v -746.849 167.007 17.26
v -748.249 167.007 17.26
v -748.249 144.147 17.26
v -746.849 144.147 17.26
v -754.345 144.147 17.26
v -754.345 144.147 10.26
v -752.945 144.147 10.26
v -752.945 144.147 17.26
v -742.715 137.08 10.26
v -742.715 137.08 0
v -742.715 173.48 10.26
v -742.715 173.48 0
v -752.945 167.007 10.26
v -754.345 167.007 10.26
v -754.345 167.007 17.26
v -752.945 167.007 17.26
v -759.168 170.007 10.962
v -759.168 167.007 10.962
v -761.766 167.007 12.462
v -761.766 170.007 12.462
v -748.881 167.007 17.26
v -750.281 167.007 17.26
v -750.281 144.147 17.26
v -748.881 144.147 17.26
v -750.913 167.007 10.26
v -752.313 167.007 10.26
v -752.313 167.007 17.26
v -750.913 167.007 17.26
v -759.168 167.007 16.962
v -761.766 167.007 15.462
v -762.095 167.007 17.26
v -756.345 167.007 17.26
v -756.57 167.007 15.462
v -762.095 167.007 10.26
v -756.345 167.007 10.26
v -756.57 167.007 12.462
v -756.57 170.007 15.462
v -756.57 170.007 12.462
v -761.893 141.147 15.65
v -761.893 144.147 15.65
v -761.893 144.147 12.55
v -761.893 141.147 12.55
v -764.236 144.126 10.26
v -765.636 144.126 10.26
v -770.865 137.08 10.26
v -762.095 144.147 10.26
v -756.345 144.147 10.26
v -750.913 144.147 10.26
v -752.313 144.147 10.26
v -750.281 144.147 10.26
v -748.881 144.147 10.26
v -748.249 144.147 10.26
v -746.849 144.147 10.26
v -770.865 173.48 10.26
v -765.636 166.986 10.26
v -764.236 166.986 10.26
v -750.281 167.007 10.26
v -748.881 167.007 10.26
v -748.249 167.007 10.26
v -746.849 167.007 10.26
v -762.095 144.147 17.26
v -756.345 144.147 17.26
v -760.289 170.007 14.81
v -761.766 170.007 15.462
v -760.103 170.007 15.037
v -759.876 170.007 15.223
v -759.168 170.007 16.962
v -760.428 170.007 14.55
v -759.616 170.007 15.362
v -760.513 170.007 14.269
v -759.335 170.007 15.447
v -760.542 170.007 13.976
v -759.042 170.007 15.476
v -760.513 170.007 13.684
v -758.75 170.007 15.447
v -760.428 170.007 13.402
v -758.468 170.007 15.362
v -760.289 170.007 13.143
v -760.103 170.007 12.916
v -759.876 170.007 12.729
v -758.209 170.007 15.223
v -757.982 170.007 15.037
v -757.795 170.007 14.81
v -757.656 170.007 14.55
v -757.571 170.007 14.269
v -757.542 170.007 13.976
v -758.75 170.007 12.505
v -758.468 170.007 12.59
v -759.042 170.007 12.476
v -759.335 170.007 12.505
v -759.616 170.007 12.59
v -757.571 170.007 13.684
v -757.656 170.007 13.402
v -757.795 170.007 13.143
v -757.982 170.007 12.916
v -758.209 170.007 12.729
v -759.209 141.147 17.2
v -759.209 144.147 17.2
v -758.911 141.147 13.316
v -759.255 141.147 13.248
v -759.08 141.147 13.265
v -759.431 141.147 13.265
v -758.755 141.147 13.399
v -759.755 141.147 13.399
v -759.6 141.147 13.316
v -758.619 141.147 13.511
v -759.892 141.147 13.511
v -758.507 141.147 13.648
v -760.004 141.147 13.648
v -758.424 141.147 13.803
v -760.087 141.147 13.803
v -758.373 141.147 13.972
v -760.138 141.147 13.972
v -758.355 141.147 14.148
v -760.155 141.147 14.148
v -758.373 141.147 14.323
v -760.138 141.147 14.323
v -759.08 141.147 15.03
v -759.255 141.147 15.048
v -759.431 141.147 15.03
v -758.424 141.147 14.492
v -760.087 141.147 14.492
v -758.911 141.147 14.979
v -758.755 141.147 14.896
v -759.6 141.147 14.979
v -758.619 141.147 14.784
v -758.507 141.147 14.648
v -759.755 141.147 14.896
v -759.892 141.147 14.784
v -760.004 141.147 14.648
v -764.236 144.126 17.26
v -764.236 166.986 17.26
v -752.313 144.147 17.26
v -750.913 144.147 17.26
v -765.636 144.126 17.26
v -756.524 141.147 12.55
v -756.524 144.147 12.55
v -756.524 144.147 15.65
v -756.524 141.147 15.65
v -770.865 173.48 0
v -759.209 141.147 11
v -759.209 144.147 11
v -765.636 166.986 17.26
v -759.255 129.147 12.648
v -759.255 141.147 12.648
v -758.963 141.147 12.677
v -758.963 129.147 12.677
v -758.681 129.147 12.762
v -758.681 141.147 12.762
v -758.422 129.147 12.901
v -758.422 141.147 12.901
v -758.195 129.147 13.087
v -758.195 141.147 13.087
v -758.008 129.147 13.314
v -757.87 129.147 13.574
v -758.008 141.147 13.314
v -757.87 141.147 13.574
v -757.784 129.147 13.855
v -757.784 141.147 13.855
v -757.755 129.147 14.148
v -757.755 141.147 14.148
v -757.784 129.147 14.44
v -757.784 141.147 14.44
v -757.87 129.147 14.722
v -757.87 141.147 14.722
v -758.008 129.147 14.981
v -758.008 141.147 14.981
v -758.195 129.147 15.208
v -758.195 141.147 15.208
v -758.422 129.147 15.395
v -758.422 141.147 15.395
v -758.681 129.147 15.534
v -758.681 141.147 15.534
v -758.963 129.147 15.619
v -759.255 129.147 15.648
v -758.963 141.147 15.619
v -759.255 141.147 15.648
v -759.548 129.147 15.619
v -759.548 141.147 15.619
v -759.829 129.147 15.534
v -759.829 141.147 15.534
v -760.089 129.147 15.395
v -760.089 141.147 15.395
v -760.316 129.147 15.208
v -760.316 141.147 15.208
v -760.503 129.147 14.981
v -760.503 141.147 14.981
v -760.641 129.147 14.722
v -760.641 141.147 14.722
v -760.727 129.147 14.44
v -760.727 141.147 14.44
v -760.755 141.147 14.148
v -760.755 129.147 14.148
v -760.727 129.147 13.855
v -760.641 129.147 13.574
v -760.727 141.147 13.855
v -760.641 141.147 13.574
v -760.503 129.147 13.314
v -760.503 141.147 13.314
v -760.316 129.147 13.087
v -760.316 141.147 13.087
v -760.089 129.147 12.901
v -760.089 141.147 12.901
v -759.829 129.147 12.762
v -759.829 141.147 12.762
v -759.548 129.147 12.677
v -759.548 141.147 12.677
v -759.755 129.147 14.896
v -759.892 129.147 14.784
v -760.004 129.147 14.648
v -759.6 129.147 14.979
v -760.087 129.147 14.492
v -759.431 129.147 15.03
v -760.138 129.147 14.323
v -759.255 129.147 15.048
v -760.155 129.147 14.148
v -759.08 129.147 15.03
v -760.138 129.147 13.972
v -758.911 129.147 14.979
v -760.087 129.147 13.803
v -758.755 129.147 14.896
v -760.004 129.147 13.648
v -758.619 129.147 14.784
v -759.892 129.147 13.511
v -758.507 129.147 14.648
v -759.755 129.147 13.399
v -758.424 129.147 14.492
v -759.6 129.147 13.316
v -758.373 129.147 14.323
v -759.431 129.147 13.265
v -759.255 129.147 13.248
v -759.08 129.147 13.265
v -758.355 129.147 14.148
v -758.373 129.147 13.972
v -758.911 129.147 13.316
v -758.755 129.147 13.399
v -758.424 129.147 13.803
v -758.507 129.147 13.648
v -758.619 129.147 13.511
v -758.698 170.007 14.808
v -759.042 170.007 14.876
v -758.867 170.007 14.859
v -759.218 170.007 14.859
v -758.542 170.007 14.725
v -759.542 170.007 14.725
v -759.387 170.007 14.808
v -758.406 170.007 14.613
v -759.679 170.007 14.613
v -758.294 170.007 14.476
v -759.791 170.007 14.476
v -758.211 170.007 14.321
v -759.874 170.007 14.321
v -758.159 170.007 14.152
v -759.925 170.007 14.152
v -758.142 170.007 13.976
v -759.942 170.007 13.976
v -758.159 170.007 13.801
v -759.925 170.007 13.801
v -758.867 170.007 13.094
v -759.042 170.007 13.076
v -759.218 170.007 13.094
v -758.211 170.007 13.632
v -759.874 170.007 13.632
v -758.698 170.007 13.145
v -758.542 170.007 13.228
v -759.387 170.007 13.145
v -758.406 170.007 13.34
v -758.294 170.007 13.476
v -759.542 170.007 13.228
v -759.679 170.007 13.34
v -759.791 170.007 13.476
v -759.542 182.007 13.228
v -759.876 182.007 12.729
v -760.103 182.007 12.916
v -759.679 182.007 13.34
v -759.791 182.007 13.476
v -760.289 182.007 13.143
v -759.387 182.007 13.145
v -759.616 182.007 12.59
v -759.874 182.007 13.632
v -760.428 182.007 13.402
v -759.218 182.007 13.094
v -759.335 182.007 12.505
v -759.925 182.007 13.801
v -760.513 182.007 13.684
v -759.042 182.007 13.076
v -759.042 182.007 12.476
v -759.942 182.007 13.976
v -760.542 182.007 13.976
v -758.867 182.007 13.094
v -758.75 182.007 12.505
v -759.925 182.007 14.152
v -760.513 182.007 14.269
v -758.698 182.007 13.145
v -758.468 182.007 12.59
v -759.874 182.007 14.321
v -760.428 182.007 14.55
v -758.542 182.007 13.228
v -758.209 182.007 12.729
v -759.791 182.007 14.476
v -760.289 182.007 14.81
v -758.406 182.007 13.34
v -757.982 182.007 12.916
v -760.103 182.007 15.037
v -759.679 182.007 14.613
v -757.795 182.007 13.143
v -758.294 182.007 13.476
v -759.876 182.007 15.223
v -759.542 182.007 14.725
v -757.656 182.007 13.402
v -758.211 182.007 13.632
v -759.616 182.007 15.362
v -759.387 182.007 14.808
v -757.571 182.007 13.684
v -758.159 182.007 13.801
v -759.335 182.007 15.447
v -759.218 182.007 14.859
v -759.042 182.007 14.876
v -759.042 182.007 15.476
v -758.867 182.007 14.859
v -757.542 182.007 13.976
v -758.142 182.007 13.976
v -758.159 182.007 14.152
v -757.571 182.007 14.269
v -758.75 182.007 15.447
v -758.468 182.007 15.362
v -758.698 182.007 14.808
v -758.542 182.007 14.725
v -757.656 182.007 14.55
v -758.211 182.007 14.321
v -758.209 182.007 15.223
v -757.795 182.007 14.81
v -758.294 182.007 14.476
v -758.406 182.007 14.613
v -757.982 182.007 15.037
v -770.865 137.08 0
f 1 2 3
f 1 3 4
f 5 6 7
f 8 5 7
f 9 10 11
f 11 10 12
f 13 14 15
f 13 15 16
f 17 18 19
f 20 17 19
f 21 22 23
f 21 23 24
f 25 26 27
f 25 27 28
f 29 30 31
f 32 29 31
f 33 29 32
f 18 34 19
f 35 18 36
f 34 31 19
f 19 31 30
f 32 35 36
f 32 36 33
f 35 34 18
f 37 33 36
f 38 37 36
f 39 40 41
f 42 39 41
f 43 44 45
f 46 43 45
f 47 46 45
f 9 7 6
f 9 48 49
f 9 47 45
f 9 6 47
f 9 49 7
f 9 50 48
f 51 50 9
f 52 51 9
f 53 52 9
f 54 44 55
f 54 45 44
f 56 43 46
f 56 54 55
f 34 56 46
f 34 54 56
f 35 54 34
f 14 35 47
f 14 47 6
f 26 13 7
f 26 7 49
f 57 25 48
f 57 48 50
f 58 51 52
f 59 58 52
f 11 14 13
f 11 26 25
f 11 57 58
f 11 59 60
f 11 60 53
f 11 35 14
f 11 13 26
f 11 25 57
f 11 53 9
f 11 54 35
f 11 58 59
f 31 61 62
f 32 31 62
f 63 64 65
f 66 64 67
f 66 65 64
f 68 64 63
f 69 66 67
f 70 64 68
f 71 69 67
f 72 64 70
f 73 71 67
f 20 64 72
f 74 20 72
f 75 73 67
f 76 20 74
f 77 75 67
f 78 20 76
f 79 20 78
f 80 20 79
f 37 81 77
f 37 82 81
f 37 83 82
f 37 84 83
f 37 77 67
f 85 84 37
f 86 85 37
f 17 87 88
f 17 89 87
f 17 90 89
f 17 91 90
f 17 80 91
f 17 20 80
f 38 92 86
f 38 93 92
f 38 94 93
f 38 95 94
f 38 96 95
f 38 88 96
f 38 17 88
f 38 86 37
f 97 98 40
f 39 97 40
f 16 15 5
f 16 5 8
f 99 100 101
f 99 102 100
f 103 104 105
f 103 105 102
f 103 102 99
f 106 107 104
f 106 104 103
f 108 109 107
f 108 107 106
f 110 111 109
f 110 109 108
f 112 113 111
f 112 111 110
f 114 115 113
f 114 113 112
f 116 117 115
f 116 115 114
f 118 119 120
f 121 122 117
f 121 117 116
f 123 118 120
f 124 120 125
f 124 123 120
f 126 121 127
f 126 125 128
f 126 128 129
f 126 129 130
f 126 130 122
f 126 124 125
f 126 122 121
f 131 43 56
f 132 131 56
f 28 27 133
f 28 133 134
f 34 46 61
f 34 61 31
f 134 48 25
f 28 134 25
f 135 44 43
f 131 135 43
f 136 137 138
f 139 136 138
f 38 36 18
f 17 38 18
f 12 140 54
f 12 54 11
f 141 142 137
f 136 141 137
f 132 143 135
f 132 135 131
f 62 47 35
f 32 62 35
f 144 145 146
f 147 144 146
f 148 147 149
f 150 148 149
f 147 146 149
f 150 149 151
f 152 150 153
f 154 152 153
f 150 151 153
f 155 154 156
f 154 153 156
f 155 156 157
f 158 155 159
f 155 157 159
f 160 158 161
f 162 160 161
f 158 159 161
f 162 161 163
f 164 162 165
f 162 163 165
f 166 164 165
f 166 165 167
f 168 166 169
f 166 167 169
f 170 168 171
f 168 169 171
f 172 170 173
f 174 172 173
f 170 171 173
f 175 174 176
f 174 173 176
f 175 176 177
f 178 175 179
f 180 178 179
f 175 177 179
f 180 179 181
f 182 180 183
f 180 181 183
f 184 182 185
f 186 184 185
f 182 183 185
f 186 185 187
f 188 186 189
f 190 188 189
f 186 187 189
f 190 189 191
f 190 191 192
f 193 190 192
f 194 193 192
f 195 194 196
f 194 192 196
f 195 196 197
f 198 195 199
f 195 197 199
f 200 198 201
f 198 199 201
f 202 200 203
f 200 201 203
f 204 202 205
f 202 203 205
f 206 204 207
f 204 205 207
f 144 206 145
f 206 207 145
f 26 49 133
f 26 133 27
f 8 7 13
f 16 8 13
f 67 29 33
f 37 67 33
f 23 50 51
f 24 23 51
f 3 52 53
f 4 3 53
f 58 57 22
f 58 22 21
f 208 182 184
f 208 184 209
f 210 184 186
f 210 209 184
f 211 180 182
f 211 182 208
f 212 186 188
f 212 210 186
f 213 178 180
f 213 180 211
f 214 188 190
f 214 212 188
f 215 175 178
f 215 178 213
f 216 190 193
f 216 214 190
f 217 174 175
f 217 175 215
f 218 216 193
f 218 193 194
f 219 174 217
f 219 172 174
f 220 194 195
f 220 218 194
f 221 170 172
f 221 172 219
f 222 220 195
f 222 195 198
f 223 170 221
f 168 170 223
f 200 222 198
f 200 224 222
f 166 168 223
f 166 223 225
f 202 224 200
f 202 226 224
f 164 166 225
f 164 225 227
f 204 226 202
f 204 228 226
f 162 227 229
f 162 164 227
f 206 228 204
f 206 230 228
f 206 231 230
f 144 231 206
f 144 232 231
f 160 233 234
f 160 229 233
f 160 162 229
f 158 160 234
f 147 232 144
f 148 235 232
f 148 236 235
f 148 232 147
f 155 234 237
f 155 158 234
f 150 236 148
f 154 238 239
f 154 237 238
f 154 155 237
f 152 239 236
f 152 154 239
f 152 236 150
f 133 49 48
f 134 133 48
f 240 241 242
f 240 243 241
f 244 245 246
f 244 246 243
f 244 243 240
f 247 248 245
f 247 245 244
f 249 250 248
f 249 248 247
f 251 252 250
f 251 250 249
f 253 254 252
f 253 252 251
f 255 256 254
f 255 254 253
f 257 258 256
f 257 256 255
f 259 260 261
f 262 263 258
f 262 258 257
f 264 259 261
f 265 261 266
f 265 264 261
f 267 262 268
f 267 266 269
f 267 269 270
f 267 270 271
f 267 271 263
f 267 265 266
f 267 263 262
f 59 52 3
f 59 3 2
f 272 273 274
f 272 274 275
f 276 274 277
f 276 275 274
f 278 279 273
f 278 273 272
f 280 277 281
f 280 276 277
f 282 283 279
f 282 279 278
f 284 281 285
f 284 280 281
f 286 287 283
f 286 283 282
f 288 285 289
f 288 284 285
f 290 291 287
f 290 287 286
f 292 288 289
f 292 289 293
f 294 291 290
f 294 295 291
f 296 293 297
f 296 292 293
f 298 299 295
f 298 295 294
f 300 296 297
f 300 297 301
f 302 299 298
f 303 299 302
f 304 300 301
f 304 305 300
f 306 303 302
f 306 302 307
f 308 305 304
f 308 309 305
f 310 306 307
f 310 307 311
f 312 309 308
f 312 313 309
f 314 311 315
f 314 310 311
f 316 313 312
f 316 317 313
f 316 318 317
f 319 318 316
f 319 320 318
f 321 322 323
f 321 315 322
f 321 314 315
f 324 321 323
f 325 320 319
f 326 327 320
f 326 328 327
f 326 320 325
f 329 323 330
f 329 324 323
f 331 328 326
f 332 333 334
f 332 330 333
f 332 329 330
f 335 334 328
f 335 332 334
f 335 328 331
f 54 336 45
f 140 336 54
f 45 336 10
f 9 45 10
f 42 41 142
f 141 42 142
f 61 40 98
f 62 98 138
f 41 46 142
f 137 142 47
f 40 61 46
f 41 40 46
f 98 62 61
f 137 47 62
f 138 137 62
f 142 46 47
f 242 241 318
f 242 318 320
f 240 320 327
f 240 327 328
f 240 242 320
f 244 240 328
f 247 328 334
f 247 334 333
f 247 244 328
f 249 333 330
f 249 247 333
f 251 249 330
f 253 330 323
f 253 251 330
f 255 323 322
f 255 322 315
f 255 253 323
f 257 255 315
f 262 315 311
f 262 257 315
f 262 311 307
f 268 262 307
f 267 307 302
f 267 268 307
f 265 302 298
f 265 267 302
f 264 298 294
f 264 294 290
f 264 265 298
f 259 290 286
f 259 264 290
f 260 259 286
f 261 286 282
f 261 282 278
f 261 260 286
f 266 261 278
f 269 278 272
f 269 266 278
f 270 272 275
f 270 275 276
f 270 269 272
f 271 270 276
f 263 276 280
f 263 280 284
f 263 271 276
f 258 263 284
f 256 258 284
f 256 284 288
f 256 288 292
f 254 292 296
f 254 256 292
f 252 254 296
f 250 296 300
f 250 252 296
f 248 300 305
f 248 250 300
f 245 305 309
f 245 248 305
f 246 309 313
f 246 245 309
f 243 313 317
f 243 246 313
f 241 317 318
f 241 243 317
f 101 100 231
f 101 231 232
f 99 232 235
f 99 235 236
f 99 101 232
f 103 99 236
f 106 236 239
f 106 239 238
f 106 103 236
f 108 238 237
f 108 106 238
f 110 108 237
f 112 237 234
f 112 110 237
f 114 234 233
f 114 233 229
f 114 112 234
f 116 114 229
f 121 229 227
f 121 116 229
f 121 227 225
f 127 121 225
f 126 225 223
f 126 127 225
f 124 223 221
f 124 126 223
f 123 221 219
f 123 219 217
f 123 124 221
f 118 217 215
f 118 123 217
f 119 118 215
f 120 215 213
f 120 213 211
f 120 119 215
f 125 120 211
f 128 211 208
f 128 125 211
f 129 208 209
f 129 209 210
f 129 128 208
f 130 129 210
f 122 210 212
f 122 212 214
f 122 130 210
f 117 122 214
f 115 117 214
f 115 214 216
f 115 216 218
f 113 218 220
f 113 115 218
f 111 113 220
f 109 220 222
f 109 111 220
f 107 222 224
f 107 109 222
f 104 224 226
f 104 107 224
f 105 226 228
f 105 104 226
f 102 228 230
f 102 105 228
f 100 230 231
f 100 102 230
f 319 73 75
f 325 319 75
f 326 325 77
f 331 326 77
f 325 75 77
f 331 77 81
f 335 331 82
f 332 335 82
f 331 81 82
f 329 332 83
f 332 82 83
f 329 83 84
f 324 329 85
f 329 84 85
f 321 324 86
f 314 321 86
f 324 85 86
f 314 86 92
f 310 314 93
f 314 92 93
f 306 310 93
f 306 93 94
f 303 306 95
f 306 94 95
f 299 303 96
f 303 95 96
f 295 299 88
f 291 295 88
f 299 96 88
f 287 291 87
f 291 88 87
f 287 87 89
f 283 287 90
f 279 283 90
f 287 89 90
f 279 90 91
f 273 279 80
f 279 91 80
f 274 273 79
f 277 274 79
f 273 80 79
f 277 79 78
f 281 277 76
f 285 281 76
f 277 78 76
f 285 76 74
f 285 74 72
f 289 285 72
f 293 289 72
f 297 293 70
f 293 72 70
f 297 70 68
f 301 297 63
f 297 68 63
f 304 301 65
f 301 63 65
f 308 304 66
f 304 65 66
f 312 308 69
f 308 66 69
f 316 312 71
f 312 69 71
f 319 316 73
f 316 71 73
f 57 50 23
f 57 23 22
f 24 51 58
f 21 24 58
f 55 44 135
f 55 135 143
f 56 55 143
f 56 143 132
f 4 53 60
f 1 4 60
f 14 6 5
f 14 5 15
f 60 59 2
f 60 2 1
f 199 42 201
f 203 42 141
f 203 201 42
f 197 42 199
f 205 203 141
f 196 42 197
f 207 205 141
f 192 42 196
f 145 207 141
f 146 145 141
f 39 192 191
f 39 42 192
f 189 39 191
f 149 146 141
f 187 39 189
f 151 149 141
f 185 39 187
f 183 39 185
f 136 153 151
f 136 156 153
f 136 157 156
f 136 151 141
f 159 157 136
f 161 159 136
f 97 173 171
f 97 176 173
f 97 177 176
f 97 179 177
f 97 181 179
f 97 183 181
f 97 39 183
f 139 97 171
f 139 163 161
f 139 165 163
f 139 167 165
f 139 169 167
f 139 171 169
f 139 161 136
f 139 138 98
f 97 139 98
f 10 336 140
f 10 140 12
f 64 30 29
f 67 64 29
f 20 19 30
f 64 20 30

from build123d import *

# Parameters (mm, degrees)
SKETCH1_W           = 28.15
SKETCH1_H           = 36.4
BOSS_EXTRUDE1_DEPTH = 10.26
SKETCH2_W           = 5.75
SKETCH2_H           = 22.86
SKETCH2_W_2         = 1.4
BOSS_EXTRUDE5_DEPTH = 7
BOSS_EXTRUDE6_DEPTH = 3
SKETCH5_R           = 1.5
SKETCH5_R_2         = 0.9
BOSS_EXTRUDE7_DEPTH = 12
BOSS_EXTRUDE8_DEPTH = 3
SKETCH8_R           = 1.5
SKETCH8_R_2         = 0.9
BOSS_EXTRUDE9_DEPTH = 12


with BuildPart() as part:
    # Sketch1 → Boss-Extrude1 (new body)
    with BuildSketch(Plane.XY):
        with Locations((-756.790122614, 155.279969002)):
            Rectangle(SKETCH1_W, SKETCH1_H)
    extrude(amount=BOSS_EXTRUDE1_DEPTH)

    # Sketch2 → Boss-Extrude5 (add)
    with BuildSketch(Plane.XY.offset(10.26)):
        with Locations((-759.219593617, 155.576927604)):
            Rectangle(SKETCH2_W, SKETCH2_H)
        with Locations((-753.644593617, 155.576927604)):
            Rectangle(SKETCH2_W_2, SKETCH2_H)
        with Locations((-749.580593617, 155.576927604)):
            Rectangle(SKETCH2_W_2, SKETCH2_H)
        with Locations((-747.548593617, 155.576927604)):
            Rectangle(SKETCH2_W_2, SKETCH2_H)
        with Locations((-751.612593617, 155.576927604)):
            Rectangle(SKETCH2_W_2, SKETCH2_H)
        with Locations((-764.936255693, 155.555778802)):
            Rectangle(SKETCH2_W_2, SKETCH2_H)
    extrude(amount=BOSS_EXTRUDE5_DEPTH)

    # Sketch4 → Boss-Extrude6 (add)
    with BuildSketch(Plane.XZ.offset(-144.146927604)):
        Polygon((-759.208791207, 11.000445338), (-756.524112455, 12.550445338), (-756.524112455, 15.650445338), (-759.208791207, 17.200445338), (-761.893469959, 15.650445338), (-761.893469959, 12.550445338), align=None)
    extrude(amount=BOSS_EXTRUDE6_DEPTH)

    # Sketch5 → Boss-Extrude7 (add)
    with BuildSketch(Plane.XZ.offset(-141.146927604)):
        with Locations(Location((-759.25539639, 14.147787096, 0), (0, 0, 270))):
            Circle(SKETCH5_R)
        with Locations(Location((-759.25539639, 14.147787096, 0), (0, 0, 270))):
            Circle(SKETCH5_R_2, mode=Mode.SUBTRACT)
    extrude(amount=BOSS_EXTRUDE7_DEPTH)

    # Sketch6 → Boss-Extrude8 (add)
    with BuildSketch(Plane(origin=(0, 167.006927604, 0), x_dir=(1, 0, 0), z_dir=(0, 1, 0))):
        Polygon((-759.16759572, -16.962225379), (-756.569519509, -15.462225379), (-756.569519509, -12.462225379), (-759.16759572, -10.962225379), (-761.765671931, -12.462225379), (-761.765671931, -15.462225379), align=None)
    extrude(amount=BOSS_EXTRUDE8_DEPTH)

    # Sketch8 → Boss-Extrude9 (add)
    with BuildSketch(Plane(origin=(0, 170.006927604, 0), x_dir=(1, 0, 0), z_dir=(0, 1, 0))):
        with Locations(Location((-759.042188193, -13.976282546, 0), (0, 0, 270))):
            Circle(SKETCH8_R)
        with Locations(Location((-759.042188193, -13.976282546, 0), (0, 0, 270))):
            Circle(SKETCH8_R_2, mode=Mode.SUBTRACT)
    extrude(amount=BOSS_EXTRUDE9_DEPTH)


solid = part.part
